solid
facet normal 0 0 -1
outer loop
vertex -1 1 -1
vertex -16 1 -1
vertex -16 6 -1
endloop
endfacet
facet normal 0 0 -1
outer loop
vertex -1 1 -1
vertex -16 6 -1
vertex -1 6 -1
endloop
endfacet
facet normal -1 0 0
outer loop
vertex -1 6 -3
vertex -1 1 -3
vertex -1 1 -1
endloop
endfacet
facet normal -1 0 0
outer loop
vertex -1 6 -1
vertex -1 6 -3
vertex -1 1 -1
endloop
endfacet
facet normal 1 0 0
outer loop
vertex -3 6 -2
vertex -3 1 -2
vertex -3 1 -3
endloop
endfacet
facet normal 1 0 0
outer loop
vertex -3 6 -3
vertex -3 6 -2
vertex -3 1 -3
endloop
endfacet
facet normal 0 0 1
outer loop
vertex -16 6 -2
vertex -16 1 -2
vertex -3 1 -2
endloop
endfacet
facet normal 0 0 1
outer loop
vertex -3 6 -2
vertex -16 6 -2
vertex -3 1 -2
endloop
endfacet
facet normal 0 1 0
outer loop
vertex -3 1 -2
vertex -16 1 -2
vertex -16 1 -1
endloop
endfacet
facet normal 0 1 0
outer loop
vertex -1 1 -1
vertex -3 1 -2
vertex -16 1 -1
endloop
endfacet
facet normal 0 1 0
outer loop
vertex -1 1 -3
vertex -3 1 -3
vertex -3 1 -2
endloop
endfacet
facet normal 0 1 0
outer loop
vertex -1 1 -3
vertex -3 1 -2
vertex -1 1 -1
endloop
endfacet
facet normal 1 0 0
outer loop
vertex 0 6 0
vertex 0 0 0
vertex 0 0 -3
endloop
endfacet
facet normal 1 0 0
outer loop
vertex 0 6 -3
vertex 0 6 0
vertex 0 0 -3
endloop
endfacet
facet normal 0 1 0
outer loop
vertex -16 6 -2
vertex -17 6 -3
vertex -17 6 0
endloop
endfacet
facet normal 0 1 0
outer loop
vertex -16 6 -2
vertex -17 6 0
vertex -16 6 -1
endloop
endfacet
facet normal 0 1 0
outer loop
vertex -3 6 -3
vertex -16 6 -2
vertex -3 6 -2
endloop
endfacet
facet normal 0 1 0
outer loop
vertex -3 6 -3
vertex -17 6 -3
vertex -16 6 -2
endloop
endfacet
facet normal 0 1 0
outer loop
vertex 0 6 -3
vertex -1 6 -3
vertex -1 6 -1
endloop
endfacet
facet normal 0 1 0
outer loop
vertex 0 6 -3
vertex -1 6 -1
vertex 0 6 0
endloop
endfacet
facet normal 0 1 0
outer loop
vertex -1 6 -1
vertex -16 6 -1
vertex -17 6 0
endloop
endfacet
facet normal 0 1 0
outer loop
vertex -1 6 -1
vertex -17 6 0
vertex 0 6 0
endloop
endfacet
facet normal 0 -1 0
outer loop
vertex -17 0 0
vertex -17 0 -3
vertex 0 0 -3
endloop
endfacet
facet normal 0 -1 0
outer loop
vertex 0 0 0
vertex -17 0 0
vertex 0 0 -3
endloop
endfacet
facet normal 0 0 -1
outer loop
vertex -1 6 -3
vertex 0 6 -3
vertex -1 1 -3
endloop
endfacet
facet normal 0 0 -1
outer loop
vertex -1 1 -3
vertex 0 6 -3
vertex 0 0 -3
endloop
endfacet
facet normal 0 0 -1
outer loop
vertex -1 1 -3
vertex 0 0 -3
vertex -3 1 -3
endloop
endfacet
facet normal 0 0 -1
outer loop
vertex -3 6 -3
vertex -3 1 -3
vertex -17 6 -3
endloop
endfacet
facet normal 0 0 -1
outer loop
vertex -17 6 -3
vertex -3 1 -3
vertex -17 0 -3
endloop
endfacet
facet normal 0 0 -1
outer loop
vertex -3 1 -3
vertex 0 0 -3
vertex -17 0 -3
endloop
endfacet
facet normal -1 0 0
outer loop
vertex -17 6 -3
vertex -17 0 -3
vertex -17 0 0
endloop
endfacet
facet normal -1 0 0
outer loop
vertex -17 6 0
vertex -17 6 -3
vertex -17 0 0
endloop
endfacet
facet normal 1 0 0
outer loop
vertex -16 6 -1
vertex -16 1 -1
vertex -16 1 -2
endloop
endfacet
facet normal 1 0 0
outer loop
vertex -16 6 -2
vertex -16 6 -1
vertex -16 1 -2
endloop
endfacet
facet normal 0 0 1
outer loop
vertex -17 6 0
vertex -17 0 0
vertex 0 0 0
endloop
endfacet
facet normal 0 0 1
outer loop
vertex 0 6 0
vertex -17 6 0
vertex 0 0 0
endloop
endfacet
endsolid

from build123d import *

# Parameters (mm, degrees)
BOSS_EXTRUDE1_DEPTH = 6
BOSS_EXTRUDE2_DEPTH = 1


with BuildPart() as part:
    # Sketch1 → Boss-Extrude1 (new body)
    with BuildSketch(Plane(origin=(0, 0, 0), x_dir=(1, 0, 0), z_dir=(0, 1, 0))):
        Polygon((0, 0), (0, 3), (-1, 3), (-1, 1), (-16, 1), (-16, 2), (-3, 2), (-3, 3), (-17, 3), (-17, 0), align=None)
    extrude(amount=BOSS_EXTRUDE1_DEPTH)

    # Sketch1<3> → Boss-Extrude2 (add)
    with BuildSketch(Plane(origin=(0, 0, 0), x_dir=(1, 0, 0), z_dir=(0, 1, 0))):
        Polygon((-16, 1), (-1, 1), (-1, 3), (-3, 3), (-3, 2), (-16, 2), align=None)
    extrude(amount=BOSS_EXTRUDE2_DEPTH)


solid = part.part
